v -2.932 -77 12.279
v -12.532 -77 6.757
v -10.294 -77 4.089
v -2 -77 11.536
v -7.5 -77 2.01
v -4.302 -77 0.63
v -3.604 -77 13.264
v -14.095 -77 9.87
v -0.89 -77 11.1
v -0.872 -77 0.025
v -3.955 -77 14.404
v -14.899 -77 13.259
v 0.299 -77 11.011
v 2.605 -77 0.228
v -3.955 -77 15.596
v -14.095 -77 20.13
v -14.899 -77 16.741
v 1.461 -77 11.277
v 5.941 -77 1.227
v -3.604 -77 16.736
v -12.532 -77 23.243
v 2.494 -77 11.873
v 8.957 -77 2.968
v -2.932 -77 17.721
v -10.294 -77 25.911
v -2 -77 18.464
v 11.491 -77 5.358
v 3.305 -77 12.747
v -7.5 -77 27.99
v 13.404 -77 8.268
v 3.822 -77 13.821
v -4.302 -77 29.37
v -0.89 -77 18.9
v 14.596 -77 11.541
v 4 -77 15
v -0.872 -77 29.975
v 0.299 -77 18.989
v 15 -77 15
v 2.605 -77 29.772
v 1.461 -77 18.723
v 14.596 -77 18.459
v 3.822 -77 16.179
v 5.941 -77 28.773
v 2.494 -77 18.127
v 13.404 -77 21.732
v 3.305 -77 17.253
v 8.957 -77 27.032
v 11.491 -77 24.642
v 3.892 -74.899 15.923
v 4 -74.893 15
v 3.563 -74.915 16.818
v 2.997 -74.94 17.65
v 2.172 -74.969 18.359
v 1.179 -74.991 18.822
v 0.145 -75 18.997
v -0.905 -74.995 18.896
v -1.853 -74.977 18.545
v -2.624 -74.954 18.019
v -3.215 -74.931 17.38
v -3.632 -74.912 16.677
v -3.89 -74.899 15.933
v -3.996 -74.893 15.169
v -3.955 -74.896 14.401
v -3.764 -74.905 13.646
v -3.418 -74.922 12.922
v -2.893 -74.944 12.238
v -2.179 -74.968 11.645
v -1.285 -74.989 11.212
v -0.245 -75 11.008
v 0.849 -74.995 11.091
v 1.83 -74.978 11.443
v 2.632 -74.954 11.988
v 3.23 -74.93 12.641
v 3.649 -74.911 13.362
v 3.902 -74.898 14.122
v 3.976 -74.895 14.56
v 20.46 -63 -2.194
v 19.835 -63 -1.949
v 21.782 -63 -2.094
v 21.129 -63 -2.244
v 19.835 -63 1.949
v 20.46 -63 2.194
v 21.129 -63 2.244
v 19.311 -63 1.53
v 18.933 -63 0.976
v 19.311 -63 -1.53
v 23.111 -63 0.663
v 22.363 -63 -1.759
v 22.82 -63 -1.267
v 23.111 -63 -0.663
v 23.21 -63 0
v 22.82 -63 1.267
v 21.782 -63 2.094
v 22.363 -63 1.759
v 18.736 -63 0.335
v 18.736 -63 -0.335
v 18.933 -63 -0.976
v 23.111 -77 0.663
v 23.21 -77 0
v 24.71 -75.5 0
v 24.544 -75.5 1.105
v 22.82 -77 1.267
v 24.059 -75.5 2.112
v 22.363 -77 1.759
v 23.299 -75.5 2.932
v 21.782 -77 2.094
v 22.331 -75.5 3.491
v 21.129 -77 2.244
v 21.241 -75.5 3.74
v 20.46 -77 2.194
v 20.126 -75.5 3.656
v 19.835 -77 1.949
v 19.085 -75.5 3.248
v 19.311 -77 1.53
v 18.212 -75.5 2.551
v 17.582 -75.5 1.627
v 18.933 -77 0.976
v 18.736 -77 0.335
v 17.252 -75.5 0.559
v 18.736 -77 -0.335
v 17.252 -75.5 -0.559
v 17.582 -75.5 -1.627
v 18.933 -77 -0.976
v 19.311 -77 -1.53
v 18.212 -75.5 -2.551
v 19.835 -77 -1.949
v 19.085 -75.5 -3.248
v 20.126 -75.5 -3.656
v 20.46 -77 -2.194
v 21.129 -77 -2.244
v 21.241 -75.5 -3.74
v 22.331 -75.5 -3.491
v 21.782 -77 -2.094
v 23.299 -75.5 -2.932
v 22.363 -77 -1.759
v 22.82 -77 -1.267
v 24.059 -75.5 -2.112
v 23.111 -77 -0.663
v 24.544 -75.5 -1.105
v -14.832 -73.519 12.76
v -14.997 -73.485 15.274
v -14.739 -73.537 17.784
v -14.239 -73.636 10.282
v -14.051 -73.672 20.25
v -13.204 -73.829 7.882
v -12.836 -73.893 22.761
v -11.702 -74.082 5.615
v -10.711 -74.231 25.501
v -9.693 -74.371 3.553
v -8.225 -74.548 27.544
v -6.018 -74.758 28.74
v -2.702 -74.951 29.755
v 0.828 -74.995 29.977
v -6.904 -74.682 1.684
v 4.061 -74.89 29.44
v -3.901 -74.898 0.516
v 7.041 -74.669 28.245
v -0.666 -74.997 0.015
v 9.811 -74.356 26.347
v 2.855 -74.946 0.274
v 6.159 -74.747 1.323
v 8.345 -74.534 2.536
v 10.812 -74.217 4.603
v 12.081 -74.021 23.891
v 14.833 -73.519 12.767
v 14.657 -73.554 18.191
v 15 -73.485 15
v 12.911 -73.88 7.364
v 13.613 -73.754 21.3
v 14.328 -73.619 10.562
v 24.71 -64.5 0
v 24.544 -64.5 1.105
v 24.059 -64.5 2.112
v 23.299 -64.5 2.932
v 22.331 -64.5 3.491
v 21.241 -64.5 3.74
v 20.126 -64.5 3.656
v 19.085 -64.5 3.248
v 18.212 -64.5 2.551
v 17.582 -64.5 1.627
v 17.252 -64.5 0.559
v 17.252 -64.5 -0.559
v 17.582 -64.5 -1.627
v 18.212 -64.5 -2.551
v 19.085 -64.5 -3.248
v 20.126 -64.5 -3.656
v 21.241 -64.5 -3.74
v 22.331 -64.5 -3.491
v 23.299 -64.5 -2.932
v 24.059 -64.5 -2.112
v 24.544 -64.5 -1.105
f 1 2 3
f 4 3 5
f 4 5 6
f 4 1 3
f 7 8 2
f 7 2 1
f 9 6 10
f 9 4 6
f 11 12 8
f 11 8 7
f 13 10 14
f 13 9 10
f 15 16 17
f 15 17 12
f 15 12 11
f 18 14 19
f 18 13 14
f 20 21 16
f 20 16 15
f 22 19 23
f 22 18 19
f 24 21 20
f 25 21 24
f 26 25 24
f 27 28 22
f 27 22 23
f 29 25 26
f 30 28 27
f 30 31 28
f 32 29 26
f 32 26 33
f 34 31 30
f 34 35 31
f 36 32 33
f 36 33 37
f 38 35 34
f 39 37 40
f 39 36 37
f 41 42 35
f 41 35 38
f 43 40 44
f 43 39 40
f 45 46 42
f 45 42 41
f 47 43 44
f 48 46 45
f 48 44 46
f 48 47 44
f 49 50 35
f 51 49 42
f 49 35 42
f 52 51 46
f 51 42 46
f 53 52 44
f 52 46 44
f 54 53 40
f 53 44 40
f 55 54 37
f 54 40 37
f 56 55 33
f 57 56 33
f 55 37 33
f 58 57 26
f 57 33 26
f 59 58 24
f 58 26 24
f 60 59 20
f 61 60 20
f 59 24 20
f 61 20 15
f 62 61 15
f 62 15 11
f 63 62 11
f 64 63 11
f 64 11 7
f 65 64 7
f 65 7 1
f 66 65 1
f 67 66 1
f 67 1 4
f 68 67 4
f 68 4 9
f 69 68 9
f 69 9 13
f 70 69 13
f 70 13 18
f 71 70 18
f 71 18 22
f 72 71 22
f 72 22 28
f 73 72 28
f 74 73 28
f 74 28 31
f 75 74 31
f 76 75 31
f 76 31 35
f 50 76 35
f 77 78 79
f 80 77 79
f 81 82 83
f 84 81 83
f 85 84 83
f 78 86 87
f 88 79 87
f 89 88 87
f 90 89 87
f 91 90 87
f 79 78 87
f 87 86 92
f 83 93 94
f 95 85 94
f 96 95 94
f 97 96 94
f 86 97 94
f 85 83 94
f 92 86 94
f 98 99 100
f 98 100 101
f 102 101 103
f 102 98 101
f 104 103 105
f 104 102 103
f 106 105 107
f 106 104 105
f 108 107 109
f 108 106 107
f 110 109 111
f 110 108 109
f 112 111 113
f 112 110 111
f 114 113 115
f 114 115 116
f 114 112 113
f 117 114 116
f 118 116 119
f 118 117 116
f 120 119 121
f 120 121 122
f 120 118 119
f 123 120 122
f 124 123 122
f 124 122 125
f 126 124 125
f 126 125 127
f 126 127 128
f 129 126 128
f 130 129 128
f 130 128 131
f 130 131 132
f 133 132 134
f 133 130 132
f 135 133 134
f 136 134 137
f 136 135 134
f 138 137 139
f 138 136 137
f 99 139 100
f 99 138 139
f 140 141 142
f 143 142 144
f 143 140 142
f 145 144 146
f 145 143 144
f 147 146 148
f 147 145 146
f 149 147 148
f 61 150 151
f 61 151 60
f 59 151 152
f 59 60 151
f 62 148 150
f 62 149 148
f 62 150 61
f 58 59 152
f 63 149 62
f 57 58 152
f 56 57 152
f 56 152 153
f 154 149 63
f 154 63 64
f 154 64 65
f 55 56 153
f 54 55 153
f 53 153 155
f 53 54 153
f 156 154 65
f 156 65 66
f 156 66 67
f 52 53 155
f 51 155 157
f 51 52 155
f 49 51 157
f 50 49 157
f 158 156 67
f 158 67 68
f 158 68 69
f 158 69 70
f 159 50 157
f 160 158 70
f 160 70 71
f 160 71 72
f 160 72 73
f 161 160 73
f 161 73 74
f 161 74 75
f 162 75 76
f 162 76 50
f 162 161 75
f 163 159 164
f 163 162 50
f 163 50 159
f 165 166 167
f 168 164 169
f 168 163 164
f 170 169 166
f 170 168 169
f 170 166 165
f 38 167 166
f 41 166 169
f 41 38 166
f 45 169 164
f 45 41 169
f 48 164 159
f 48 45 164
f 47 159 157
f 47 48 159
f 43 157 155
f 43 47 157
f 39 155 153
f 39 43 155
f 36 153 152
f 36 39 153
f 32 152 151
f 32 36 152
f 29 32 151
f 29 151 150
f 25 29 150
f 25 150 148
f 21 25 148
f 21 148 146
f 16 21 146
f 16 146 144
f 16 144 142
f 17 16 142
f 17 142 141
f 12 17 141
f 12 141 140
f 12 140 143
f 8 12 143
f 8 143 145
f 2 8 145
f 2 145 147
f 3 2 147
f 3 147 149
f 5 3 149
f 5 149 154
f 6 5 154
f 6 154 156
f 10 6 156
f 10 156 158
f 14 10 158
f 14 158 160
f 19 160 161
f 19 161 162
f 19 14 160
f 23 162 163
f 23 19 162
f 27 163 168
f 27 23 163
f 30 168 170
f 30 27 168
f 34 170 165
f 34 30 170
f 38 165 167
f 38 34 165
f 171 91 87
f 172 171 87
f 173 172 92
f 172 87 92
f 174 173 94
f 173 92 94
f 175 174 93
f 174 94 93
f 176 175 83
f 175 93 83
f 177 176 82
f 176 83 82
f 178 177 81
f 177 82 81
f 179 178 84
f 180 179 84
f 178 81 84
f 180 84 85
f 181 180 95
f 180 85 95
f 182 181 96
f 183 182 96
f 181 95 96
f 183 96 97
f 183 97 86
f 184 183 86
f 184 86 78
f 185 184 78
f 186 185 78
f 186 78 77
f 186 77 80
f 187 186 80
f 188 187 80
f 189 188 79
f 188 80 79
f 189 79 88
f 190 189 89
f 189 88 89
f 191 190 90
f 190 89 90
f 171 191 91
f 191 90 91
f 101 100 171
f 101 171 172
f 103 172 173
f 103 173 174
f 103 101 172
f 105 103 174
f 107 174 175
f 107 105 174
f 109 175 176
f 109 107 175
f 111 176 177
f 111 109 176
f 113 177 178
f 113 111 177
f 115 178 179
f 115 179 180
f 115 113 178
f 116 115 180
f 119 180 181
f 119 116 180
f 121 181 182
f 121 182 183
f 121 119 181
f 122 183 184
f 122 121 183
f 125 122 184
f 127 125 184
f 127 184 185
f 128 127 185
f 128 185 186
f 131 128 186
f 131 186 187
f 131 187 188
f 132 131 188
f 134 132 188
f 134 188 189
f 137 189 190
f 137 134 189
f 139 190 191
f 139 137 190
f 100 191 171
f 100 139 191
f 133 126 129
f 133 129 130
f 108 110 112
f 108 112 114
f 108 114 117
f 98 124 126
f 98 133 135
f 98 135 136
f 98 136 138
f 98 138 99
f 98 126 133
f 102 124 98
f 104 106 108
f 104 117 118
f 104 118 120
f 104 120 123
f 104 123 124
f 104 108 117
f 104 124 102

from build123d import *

# Parameters (mm, degrees)
F2_R     = 15
F3_DEPTH = 5
F0_R     = 75
F4_DEPTH = 50
F5_R     = 4
F6_DEPTH = 25
F7_R     = 3.75
F8_DEPTH = 14
F9_SIZE  = 1.5


with BuildPart() as f3:
    # F2 (on offset) → F3 (new body)
    with BuildSketch(Plane.XZ.offset(77)):
        with Locations((0, 15)):
            Circle(F2_R)
    extrude(amount=-F3_DEPTH)

    # F0 (on Top) → F4 (cut)
    with BuildSketch(Plane.XY):
        Circle(F0_R)
    extrude(amount=F4_DEPTH, mode=Mode.SUBTRACT)

    # F5 (on face) → F6 (cut)
    with BuildSketch(Plane.XZ.offset(77)):
        with Locations((0, 15)):
            Circle(F5_R)
    extrude(amount=-F6_DEPTH, mode=Mode.SUBTRACT)


with BuildPart() as f8:
    # F7 (on offset) → F8 (new body)
    with BuildSketch(Plane.XZ.offset(77)):
        with Locations((20.96048, 0)):
            Circle(F7_R)
    extrude(amount=-F8_DEPTH)

    # F9
    f9_edges = [f8.edges().sort_by_distance(p)[0] for p in [
        (17.21048, -77, 0),
        (17.21048, -63, 0),
    ]]
    chamfer(f9_edges, length=F9_SIZE)


solid = Compound([f3.part, f8.part])
